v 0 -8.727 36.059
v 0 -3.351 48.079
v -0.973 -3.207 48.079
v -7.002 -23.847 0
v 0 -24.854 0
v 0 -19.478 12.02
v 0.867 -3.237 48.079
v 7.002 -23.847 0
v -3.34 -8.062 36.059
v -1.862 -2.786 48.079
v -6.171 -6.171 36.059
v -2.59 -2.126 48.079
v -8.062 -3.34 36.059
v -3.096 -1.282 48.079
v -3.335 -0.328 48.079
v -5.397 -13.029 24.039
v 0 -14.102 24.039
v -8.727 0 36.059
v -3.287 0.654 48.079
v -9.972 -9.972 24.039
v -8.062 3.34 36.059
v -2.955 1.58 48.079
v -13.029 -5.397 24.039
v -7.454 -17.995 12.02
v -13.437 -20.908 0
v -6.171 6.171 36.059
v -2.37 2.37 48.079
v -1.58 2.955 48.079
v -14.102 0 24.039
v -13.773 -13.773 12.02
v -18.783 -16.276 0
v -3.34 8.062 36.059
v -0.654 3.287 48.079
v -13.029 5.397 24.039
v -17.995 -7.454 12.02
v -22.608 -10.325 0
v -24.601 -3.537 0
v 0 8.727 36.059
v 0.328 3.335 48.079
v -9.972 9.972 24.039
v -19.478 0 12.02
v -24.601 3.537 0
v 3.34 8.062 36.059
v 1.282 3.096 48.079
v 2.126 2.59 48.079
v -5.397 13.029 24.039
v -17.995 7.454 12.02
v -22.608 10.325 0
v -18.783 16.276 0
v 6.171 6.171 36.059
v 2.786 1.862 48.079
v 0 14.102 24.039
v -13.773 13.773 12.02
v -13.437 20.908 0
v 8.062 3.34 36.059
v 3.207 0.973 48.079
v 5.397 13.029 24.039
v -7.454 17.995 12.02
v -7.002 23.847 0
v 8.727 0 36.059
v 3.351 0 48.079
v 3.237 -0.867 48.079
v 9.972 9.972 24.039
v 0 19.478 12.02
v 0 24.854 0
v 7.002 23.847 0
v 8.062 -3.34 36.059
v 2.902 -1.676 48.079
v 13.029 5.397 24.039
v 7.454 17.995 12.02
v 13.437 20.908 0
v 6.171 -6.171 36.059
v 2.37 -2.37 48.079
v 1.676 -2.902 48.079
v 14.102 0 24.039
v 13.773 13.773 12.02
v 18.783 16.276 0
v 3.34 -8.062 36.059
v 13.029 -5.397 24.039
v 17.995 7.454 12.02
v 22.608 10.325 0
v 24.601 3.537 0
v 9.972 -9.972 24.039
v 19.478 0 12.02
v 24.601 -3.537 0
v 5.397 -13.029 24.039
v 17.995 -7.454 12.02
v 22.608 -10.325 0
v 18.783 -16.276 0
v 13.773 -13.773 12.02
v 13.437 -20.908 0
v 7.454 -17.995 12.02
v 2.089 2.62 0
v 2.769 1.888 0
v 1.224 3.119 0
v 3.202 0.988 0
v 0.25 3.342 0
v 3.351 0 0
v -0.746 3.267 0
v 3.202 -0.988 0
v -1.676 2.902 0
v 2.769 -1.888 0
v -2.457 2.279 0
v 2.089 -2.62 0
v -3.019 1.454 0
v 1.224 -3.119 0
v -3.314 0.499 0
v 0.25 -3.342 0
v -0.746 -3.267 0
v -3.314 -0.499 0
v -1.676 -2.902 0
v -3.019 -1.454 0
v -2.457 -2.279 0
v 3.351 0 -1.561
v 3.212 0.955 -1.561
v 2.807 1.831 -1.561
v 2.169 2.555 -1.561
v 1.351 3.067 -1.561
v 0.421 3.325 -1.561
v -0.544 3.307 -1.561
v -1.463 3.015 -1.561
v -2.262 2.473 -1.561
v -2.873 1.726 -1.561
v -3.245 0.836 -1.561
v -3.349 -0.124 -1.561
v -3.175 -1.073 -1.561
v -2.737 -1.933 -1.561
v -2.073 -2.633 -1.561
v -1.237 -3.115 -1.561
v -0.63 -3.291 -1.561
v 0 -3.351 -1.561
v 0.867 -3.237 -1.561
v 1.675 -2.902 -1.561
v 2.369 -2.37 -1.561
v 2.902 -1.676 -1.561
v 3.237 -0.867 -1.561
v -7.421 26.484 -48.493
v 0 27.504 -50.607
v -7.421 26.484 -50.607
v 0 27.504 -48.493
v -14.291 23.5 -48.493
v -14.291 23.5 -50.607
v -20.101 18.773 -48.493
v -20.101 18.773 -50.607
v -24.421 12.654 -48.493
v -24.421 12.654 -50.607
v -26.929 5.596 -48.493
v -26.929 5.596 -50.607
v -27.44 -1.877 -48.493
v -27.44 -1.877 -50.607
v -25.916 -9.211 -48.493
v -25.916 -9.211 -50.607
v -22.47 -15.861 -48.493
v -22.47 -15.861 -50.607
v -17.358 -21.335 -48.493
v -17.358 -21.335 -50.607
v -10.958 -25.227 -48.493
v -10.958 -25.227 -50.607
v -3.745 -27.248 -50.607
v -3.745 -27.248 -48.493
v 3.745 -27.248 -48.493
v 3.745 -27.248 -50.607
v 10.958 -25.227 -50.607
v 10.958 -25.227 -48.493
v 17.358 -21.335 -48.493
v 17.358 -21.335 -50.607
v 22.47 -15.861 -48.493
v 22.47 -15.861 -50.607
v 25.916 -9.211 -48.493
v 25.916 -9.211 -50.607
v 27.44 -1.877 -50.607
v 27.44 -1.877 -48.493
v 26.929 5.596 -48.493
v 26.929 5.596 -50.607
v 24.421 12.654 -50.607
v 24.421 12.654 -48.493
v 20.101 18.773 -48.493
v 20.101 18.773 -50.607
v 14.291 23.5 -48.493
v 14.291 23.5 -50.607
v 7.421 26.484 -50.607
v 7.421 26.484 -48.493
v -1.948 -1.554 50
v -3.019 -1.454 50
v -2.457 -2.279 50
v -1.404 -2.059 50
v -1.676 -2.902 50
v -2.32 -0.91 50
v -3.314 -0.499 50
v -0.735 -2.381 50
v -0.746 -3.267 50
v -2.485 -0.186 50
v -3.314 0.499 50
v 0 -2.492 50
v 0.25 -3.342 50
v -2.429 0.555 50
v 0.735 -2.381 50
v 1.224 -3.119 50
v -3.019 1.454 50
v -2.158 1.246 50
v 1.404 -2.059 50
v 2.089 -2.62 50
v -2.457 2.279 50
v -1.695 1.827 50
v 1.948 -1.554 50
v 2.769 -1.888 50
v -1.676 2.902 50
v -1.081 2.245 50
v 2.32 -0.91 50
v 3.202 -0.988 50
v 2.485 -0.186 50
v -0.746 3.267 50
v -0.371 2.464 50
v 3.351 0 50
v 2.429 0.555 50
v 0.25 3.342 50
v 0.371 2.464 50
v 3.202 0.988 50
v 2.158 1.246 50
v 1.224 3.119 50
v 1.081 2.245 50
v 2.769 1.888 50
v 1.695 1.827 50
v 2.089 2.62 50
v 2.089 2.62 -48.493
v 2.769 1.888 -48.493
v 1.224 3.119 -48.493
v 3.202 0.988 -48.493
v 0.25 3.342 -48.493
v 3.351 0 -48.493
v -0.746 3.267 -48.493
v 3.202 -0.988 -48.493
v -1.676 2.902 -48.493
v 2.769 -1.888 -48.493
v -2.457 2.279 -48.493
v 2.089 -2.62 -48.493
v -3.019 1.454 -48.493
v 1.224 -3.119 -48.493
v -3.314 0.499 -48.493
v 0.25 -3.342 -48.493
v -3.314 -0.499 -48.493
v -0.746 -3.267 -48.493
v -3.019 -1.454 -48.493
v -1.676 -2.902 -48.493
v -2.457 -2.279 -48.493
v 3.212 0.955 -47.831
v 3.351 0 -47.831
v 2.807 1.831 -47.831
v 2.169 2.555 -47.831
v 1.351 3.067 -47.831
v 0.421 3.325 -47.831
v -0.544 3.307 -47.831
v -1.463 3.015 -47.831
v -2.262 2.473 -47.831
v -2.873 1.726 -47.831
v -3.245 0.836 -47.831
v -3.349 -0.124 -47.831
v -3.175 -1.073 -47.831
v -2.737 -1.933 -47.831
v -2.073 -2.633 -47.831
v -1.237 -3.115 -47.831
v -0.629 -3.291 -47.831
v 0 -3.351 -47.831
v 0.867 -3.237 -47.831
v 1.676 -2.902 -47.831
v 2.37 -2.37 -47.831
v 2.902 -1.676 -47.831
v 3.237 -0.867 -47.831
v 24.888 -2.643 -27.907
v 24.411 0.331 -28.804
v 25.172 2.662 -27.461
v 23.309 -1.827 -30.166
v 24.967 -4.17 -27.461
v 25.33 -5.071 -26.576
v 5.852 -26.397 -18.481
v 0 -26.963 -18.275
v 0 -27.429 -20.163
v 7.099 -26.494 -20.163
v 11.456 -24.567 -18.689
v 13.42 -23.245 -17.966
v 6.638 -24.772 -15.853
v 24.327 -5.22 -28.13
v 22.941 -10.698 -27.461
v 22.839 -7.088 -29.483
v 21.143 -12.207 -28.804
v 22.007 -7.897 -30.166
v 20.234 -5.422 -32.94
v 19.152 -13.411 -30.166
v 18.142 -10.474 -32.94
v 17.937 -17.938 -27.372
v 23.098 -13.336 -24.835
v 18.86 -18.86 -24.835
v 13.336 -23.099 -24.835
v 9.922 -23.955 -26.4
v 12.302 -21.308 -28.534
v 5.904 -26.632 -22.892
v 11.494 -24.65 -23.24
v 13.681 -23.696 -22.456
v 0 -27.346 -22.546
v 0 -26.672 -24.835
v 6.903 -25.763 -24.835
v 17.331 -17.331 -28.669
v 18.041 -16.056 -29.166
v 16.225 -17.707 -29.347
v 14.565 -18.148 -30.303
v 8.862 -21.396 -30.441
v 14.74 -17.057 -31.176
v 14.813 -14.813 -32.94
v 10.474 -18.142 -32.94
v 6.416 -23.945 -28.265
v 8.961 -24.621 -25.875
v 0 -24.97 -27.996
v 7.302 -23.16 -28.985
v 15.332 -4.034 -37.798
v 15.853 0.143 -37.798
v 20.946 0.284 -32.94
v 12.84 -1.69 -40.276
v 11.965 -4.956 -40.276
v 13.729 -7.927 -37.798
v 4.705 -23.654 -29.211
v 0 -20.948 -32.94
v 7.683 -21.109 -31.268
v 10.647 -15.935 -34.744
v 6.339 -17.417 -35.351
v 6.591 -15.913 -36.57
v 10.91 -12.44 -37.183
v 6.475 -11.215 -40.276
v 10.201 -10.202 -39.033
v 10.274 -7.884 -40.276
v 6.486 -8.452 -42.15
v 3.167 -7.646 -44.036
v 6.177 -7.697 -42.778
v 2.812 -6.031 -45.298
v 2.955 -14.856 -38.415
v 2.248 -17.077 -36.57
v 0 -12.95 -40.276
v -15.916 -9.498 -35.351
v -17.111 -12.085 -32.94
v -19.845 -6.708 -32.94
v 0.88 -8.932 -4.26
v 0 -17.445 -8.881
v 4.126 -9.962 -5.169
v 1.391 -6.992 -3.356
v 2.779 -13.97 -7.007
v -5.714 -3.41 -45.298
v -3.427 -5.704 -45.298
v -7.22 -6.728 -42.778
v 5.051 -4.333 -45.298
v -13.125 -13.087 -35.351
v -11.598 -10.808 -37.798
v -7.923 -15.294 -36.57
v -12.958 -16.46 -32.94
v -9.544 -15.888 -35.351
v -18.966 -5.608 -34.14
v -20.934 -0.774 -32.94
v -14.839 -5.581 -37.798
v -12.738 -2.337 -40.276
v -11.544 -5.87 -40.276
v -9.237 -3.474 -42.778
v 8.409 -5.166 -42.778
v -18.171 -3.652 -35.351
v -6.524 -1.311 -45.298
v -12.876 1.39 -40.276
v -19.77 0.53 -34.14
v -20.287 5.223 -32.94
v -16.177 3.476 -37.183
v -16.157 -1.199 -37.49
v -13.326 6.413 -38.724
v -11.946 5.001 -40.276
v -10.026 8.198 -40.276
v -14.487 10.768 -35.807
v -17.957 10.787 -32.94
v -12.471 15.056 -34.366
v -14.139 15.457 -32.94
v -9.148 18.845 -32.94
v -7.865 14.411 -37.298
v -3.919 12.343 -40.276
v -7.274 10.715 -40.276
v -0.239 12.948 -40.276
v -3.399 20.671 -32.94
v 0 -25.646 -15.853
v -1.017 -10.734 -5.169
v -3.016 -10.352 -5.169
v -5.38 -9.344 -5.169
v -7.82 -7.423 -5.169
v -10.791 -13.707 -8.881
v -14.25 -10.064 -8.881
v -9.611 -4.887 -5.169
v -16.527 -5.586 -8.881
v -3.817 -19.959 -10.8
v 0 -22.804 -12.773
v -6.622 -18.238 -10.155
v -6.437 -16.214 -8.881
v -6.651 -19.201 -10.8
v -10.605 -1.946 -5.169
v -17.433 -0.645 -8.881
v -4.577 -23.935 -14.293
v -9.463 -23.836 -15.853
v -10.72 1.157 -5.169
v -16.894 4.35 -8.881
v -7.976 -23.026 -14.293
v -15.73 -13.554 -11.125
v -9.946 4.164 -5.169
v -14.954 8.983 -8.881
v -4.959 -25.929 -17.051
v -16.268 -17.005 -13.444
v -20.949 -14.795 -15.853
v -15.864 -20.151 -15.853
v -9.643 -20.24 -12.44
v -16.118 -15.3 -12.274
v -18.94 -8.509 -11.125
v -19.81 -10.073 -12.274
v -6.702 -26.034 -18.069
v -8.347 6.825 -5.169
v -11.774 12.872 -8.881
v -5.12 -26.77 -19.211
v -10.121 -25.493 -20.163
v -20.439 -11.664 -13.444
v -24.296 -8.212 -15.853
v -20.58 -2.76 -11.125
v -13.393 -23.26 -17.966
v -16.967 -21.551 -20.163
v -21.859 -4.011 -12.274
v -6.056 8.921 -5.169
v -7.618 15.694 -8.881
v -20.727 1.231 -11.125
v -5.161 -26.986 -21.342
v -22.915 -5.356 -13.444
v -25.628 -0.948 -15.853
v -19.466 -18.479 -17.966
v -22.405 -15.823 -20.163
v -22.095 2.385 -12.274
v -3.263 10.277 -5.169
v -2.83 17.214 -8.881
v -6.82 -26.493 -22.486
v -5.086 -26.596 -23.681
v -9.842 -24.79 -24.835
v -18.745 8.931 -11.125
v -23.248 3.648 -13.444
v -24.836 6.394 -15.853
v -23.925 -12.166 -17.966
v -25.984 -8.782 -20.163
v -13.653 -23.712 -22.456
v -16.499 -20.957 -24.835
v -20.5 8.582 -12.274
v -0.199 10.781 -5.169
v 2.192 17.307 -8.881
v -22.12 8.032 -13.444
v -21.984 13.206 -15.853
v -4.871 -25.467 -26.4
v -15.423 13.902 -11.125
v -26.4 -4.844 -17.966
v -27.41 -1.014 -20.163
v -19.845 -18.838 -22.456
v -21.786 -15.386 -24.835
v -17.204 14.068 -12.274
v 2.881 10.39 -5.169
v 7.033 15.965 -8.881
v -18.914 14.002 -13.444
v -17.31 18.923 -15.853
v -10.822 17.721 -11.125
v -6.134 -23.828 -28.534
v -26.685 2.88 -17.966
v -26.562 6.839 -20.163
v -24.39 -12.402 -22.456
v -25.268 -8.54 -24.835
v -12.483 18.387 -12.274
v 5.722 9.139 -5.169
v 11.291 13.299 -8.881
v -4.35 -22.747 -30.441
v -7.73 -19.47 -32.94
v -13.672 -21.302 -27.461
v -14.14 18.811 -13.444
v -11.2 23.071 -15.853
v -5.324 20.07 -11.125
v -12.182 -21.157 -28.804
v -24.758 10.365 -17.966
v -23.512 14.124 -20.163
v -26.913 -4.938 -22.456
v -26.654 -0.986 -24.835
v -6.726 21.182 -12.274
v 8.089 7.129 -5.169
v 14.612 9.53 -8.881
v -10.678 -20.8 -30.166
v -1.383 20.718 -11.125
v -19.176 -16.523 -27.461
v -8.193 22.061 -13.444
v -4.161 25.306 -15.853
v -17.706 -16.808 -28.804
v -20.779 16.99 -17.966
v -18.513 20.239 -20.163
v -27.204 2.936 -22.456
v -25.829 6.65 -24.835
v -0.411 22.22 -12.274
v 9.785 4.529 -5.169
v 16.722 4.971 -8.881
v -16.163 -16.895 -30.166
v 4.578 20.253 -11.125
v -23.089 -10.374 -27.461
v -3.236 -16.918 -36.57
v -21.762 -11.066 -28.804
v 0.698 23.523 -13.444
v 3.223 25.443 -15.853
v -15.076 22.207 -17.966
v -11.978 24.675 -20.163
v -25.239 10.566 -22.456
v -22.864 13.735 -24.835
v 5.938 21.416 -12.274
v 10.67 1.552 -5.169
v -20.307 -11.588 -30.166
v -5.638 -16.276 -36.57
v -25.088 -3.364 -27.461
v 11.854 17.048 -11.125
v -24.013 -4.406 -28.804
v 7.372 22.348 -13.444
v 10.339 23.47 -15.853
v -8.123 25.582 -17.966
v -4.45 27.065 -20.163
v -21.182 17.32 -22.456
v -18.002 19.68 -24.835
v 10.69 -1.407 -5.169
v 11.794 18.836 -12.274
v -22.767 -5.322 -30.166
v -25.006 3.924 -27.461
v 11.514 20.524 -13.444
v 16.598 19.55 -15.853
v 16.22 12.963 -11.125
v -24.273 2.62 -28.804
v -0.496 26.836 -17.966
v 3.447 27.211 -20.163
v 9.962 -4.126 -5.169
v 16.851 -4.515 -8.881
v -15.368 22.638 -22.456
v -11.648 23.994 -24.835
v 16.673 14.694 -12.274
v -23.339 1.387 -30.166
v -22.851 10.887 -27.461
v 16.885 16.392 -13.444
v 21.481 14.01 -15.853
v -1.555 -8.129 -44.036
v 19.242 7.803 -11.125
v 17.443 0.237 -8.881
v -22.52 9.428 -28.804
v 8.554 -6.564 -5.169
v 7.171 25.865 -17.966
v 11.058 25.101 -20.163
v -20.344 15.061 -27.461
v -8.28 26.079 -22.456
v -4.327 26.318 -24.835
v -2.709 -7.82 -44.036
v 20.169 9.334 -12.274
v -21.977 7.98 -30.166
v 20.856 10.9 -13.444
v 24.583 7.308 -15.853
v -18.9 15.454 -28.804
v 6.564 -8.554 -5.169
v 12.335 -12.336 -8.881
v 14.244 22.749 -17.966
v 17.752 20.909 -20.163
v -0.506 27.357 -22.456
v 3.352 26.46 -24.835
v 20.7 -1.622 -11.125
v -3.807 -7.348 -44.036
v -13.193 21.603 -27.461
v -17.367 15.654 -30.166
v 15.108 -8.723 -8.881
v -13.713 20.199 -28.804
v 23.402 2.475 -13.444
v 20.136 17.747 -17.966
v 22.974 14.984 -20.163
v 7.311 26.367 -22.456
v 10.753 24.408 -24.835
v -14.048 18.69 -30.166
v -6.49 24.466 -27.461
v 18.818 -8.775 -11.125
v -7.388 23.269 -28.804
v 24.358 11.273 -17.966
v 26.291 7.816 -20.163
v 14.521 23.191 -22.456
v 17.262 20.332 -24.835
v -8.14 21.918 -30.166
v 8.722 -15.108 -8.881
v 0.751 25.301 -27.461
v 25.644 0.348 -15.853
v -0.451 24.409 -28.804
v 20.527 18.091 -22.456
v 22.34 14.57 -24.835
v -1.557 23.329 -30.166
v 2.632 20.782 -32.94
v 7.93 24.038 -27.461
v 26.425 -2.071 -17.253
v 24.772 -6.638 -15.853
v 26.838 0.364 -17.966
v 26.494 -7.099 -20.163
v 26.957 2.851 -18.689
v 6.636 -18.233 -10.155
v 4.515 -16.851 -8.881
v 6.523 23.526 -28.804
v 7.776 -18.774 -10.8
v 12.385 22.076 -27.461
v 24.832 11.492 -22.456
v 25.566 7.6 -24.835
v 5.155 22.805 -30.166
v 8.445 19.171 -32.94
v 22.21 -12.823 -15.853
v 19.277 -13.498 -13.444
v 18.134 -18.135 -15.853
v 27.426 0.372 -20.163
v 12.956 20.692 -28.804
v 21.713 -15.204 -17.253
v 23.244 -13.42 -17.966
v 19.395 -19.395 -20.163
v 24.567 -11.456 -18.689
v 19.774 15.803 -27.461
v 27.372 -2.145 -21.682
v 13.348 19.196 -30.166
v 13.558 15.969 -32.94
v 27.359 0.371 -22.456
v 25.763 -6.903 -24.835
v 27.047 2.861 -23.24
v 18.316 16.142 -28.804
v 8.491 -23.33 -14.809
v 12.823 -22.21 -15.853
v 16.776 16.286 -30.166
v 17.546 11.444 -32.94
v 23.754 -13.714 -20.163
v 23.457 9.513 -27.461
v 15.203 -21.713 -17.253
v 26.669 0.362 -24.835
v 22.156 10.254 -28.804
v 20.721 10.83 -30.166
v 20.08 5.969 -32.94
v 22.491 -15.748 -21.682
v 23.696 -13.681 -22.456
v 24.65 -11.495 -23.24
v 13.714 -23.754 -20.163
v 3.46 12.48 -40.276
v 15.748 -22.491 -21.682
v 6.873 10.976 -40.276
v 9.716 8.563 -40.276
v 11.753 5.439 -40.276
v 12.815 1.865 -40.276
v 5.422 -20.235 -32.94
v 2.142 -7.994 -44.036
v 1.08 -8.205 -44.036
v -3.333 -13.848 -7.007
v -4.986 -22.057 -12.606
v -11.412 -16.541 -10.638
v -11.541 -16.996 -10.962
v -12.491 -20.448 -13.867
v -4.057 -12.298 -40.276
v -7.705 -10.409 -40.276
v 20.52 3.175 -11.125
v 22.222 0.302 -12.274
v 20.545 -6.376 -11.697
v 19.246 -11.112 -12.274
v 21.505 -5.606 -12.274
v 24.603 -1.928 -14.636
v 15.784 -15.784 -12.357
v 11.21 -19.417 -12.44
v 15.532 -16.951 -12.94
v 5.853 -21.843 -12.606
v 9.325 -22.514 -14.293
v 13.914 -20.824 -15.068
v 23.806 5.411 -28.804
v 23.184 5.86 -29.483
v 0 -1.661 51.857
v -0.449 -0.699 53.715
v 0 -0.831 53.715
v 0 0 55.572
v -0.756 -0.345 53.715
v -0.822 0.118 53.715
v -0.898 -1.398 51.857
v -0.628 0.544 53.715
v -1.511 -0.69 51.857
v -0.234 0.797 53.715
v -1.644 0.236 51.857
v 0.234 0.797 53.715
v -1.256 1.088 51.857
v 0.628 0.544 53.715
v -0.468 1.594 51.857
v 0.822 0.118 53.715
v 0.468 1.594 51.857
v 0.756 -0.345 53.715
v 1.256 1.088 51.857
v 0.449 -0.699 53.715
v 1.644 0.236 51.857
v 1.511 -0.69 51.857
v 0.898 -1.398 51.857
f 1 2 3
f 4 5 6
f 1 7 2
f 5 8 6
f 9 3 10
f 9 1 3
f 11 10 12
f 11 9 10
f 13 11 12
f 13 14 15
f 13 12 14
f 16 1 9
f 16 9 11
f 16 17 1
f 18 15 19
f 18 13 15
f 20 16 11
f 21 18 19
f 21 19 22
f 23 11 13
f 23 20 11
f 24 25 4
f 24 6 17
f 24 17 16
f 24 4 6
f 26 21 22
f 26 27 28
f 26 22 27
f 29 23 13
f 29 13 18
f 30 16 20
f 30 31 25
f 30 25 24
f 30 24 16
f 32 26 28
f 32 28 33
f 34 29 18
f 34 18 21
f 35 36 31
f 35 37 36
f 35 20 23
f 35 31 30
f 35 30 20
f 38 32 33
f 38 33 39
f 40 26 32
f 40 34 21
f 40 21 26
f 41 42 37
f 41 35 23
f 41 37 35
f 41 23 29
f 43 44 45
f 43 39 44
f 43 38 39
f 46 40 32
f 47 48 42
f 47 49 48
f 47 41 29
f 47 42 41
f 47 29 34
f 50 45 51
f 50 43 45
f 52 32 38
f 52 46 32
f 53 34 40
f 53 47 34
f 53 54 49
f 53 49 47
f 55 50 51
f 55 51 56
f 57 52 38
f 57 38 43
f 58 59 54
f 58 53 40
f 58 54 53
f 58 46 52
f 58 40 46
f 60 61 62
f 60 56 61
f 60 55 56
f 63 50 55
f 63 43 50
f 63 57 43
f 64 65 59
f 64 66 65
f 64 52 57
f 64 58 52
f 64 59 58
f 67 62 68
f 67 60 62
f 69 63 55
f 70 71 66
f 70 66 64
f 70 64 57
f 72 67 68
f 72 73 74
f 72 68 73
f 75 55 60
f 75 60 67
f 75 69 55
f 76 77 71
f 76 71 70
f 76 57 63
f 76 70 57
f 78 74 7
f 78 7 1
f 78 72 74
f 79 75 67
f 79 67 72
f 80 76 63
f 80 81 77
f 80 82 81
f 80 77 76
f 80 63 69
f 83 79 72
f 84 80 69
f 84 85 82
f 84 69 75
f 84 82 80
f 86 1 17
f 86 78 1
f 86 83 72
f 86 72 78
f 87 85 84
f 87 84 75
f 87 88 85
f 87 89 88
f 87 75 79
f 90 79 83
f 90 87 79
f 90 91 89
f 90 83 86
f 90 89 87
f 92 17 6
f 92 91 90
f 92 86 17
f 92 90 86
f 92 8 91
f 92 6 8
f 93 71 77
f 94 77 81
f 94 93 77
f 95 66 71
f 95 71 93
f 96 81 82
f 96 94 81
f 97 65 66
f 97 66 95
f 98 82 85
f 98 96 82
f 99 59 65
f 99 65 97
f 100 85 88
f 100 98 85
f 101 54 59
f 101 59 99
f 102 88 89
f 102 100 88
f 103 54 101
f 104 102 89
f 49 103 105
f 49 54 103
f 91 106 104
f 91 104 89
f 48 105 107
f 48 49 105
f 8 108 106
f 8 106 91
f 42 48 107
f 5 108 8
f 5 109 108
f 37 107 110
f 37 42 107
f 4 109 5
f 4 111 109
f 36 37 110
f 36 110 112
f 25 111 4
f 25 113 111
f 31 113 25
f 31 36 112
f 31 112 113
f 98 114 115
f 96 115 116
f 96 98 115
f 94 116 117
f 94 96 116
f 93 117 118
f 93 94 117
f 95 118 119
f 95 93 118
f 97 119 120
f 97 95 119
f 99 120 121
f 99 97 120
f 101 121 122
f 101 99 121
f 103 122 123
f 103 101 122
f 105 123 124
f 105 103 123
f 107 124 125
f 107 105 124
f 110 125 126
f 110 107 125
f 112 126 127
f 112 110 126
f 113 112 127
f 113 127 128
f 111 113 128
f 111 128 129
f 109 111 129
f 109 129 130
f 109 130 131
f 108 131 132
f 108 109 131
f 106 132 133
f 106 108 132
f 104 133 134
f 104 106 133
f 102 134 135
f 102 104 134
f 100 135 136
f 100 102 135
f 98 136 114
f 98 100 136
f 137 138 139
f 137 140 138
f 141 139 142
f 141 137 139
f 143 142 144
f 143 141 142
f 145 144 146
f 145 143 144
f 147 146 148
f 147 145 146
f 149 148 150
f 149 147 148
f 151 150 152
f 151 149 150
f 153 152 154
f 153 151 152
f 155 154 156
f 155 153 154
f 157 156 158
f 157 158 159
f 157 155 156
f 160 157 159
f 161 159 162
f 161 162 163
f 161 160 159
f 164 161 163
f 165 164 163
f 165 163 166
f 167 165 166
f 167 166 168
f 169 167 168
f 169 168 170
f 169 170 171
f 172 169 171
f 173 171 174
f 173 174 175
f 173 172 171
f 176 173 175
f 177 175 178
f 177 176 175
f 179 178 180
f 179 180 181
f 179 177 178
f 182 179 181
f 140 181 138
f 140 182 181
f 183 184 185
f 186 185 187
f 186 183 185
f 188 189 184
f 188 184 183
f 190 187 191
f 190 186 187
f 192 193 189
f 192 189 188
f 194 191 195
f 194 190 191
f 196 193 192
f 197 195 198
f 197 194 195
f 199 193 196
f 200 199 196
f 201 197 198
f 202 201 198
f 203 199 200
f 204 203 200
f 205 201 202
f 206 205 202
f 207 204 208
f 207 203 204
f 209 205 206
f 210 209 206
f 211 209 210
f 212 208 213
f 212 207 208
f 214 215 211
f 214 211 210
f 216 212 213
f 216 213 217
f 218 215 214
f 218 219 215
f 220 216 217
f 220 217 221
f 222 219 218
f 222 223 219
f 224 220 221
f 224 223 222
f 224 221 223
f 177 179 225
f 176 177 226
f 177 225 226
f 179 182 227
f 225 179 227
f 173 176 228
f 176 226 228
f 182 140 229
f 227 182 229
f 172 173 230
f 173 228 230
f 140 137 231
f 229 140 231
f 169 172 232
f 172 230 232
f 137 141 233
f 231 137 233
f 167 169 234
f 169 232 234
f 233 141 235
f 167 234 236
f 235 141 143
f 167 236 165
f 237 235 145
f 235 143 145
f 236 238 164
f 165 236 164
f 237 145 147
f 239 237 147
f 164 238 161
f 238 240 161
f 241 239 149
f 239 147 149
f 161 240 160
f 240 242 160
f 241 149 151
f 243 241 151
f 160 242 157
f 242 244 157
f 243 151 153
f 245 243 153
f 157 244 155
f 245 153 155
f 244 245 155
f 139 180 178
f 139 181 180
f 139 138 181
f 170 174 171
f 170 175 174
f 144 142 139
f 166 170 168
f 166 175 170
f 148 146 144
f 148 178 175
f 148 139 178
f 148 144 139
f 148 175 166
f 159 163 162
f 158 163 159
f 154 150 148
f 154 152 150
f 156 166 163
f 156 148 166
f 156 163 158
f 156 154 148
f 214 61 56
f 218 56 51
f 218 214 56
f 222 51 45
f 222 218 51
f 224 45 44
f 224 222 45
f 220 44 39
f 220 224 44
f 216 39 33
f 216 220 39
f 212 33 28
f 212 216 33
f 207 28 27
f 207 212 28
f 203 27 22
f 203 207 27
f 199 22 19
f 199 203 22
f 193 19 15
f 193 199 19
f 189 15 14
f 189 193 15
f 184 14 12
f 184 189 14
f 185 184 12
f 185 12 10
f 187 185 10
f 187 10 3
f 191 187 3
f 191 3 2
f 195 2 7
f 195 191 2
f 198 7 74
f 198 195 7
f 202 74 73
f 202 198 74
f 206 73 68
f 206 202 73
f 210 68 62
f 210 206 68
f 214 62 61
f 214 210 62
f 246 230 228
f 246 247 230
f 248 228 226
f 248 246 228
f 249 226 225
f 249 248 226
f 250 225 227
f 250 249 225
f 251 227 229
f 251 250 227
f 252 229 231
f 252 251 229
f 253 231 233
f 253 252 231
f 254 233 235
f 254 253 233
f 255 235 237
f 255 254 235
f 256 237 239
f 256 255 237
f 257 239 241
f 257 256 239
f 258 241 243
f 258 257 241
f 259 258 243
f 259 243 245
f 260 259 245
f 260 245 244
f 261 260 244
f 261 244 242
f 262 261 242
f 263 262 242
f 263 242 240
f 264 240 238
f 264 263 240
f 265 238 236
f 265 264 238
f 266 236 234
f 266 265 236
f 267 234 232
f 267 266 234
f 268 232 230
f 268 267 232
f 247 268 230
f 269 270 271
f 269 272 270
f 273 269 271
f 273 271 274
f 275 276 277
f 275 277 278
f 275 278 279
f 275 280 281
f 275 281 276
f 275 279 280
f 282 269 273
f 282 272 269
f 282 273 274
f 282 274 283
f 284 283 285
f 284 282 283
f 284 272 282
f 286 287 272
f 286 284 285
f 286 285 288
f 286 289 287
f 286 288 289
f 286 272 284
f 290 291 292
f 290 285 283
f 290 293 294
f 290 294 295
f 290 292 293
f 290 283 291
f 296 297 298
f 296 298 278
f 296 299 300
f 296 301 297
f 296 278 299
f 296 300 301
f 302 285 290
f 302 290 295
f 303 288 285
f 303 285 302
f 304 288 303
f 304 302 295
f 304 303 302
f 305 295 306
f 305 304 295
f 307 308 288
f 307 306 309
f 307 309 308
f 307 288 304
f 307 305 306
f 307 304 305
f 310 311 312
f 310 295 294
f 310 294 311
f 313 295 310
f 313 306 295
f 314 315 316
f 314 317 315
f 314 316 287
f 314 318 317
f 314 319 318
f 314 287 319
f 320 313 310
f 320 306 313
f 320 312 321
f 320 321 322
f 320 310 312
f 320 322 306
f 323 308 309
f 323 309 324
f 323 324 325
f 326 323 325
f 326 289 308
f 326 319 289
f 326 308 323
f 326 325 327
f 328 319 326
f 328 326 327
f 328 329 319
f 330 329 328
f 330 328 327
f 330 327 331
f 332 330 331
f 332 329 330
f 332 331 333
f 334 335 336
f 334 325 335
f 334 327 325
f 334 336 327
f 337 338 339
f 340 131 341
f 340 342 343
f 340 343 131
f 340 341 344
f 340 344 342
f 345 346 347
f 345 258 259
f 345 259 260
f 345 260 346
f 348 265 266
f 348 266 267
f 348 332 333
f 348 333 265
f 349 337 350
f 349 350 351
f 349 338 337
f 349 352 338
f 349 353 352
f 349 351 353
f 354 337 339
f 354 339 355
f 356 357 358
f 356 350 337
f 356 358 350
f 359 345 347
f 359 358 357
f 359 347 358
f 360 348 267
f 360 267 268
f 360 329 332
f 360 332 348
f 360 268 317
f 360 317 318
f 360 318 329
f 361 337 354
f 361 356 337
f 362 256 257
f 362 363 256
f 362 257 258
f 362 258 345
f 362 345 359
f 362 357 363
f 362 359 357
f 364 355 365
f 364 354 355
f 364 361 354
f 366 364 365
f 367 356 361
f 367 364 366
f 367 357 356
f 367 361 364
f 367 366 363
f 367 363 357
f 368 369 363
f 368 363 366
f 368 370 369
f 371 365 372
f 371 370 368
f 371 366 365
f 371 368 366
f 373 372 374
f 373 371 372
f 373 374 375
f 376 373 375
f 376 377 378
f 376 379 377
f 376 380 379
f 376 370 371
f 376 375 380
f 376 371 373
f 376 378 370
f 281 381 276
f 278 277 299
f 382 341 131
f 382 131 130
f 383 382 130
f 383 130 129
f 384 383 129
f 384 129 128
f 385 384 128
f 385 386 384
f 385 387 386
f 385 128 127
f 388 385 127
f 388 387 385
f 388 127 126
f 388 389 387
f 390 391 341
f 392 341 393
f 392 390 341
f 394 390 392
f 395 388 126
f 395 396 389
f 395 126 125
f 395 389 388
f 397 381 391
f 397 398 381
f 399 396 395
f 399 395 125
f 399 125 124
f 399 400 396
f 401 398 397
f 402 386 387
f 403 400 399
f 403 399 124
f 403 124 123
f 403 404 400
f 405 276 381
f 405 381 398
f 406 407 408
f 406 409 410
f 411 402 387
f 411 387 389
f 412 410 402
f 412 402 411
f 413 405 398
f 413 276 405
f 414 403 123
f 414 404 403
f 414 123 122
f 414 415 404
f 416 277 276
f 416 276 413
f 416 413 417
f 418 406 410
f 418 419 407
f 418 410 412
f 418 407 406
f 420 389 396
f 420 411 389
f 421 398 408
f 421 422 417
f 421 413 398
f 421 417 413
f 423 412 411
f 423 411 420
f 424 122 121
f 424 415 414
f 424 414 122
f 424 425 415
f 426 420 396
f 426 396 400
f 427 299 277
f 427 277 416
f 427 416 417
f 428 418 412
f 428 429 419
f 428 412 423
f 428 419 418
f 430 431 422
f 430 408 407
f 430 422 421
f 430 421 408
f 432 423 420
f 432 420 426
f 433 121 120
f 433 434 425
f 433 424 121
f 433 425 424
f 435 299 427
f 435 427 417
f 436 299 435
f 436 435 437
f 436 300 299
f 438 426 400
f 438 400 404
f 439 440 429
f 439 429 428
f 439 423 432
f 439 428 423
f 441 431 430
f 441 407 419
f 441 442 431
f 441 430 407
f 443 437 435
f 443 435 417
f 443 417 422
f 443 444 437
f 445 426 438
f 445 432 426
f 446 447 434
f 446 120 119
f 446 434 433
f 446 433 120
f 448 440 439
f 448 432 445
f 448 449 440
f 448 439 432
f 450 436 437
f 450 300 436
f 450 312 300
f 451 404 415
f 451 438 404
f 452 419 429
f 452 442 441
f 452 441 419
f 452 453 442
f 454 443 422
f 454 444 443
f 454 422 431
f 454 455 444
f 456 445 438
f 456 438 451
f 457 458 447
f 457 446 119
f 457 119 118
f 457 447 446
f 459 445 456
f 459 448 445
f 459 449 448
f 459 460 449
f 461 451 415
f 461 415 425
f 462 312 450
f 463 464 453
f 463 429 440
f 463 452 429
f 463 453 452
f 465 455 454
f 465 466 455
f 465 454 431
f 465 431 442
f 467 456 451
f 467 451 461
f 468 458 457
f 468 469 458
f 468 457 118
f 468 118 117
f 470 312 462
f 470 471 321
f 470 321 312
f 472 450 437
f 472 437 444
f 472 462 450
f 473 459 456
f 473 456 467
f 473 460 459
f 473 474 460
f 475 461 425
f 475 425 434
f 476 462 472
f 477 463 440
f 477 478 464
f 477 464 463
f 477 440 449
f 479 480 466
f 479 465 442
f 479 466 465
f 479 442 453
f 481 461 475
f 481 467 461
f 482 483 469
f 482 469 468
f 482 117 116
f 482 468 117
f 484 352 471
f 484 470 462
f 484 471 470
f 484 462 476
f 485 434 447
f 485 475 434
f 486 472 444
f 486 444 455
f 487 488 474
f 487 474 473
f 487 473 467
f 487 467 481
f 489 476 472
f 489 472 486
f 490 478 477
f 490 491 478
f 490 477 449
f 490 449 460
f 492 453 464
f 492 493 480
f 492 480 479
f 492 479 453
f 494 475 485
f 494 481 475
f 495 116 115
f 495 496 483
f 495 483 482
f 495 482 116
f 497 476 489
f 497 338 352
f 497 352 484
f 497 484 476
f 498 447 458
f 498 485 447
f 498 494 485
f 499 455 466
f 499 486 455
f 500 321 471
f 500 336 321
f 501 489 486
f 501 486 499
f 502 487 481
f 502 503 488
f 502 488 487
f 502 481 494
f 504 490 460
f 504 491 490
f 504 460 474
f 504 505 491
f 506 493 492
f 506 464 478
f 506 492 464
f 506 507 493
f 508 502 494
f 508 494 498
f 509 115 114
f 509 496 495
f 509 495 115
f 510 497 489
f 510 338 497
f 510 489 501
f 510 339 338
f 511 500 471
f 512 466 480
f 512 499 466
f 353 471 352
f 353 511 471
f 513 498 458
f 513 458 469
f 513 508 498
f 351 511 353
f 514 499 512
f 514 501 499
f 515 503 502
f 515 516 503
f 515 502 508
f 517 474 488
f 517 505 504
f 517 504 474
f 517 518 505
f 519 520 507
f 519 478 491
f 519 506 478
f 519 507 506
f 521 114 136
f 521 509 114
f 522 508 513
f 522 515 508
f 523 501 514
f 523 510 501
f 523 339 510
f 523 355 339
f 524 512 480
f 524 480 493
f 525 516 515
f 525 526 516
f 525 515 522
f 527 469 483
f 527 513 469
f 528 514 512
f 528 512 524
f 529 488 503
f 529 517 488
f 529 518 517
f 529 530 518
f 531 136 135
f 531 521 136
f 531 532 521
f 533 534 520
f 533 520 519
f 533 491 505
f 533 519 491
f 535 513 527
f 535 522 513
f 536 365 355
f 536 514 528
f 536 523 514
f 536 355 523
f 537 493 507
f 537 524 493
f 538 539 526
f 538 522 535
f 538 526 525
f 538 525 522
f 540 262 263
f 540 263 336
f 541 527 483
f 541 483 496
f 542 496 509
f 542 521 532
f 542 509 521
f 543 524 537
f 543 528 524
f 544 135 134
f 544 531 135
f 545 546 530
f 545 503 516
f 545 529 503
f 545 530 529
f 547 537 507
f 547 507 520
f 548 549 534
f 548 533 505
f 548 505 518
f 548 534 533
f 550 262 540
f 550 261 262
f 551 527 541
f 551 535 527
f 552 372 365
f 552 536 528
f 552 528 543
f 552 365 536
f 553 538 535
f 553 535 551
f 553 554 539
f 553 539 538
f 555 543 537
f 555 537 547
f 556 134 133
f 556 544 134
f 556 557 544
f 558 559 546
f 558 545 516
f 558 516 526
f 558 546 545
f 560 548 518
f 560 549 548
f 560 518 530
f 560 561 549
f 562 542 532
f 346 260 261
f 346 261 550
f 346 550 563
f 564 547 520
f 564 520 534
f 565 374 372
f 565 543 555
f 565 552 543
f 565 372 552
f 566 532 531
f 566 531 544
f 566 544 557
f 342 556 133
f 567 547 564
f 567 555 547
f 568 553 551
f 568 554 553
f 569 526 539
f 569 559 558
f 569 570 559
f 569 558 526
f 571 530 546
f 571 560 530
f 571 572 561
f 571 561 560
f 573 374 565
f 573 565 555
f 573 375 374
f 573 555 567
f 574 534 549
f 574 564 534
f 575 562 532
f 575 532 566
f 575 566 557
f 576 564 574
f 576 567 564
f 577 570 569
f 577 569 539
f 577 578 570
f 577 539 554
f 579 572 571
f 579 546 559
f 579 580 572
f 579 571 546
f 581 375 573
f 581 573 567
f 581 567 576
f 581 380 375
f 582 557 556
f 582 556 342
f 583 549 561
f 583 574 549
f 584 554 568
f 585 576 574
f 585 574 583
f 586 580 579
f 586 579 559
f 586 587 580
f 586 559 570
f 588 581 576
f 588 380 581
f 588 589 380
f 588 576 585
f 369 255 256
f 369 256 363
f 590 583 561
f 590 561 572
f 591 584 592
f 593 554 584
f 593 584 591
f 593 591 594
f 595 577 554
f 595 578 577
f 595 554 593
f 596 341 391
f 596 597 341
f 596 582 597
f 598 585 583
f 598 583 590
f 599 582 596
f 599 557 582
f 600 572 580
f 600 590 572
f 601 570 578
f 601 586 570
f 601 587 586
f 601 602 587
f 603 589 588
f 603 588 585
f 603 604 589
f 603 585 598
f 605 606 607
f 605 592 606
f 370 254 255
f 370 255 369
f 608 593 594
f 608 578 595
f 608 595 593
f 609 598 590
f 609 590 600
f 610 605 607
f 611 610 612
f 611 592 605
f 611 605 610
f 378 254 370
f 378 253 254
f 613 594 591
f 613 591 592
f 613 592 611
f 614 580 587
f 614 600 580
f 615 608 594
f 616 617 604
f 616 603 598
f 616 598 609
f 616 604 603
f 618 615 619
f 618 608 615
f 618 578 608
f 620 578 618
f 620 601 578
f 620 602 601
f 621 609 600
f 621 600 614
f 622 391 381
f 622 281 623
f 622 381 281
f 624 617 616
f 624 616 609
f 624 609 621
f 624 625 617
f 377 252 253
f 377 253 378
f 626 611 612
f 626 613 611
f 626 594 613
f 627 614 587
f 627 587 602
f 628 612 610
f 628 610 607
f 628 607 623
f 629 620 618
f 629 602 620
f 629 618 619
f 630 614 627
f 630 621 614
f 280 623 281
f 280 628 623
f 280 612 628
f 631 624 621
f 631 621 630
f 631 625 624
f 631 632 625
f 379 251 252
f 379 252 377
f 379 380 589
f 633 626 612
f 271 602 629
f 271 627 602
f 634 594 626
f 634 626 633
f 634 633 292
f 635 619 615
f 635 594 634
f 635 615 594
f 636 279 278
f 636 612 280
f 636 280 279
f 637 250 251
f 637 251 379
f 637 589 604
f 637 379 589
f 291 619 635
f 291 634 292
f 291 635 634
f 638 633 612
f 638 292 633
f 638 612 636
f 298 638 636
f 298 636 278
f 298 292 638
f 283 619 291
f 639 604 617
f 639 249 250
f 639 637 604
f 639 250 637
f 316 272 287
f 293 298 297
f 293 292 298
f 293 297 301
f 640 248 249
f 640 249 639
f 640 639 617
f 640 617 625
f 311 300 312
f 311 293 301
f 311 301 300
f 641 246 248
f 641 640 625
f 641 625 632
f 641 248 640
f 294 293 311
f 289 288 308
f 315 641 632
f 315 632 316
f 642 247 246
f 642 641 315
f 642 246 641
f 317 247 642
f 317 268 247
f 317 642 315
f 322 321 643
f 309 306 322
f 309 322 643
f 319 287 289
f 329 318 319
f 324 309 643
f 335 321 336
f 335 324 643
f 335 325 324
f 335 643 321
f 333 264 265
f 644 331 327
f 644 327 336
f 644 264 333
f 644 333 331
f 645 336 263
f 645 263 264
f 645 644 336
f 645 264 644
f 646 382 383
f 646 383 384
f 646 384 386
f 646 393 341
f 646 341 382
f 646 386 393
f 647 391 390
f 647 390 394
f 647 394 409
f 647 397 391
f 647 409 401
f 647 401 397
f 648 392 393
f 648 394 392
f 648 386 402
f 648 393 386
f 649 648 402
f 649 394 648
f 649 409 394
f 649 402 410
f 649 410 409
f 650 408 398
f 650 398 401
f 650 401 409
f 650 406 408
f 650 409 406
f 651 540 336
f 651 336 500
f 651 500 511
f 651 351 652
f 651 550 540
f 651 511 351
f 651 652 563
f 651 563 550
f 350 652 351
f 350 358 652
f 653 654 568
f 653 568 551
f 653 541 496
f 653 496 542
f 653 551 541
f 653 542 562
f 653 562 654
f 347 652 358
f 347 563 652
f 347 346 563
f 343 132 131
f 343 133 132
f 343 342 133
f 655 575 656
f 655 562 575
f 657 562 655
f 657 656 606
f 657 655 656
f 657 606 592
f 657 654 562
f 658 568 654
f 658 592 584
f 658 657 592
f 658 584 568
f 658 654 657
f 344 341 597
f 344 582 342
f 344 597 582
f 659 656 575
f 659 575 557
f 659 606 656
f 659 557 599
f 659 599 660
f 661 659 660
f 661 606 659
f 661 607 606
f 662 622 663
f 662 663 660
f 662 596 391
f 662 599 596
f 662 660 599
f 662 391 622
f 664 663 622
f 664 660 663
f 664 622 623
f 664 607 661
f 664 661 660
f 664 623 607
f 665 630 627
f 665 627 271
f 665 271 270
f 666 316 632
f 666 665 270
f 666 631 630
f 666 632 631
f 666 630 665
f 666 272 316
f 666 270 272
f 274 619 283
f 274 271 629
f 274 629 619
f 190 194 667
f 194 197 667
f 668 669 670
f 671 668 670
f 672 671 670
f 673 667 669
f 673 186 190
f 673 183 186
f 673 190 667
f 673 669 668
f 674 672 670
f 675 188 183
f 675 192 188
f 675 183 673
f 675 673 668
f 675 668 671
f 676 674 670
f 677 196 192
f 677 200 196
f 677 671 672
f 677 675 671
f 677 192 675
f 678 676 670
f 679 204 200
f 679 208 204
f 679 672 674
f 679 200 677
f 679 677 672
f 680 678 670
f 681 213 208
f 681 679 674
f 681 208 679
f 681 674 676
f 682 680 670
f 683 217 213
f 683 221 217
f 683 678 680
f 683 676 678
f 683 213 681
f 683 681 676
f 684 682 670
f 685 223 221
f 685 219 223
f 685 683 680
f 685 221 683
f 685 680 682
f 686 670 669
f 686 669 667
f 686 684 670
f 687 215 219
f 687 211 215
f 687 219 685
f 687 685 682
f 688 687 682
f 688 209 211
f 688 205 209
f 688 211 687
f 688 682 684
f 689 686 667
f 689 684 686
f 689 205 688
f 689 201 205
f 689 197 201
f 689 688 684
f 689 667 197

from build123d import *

# Parameters (mm, degrees)
F0_R     = 3.3510634676
F2_DEPTH = 50
F7_W     = 27.5042355061
F7_H     = 2.1134242415


with BuildPart() as f2:
    # F0 (on Top) → F2 (new body, symmetric)
    with BuildSketch(Plane.XY):
        Circle(F0_R)
    extrude(amount=F2_DEPTH, both=True)

    # F3 (on Right) → F4 (revolve)
    with BuildSketch(Plane.YZ):
        Polygon((0, 0), (0, 55.571809411), (-24.8537249863, 0), align=None)
    revolve(axis=Axis((0, 0, 27.7859047055), (0, 0, -1)))

    # F5 (on Right) → F6 (revolve)
    with BuildSketch(Plane.YZ):
        with BuildLine():
            Line((0, -50.3720380366), (0, 0))
            add(Edge.make_bspline(
                [(0, 0), (-13.3377713463, -6.1965659051), (-41.2377708413, -19.1585654127), (-14.1423062486, -39.6675193412), (0, -50.3720380366)],
                knots=[0, 0, 0, 0, 0.4780563293, 1, 1, 1, 1], degree=3))
        make_face()
    revolve(axis=Axis((0, 0, -25.1860190183), (0, 0, -1)))

    # F7 (on Right) → F8 (revolve)
    with BuildSketch(Plane.YZ):
        with Locations((13.752117753, -49.5501495898)):
            Rectangle(F7_W, F7_H)
    revolve(axis=Axis((0, 0, -49.5501495898), (0, 0, 1)))


solid = f2.part
